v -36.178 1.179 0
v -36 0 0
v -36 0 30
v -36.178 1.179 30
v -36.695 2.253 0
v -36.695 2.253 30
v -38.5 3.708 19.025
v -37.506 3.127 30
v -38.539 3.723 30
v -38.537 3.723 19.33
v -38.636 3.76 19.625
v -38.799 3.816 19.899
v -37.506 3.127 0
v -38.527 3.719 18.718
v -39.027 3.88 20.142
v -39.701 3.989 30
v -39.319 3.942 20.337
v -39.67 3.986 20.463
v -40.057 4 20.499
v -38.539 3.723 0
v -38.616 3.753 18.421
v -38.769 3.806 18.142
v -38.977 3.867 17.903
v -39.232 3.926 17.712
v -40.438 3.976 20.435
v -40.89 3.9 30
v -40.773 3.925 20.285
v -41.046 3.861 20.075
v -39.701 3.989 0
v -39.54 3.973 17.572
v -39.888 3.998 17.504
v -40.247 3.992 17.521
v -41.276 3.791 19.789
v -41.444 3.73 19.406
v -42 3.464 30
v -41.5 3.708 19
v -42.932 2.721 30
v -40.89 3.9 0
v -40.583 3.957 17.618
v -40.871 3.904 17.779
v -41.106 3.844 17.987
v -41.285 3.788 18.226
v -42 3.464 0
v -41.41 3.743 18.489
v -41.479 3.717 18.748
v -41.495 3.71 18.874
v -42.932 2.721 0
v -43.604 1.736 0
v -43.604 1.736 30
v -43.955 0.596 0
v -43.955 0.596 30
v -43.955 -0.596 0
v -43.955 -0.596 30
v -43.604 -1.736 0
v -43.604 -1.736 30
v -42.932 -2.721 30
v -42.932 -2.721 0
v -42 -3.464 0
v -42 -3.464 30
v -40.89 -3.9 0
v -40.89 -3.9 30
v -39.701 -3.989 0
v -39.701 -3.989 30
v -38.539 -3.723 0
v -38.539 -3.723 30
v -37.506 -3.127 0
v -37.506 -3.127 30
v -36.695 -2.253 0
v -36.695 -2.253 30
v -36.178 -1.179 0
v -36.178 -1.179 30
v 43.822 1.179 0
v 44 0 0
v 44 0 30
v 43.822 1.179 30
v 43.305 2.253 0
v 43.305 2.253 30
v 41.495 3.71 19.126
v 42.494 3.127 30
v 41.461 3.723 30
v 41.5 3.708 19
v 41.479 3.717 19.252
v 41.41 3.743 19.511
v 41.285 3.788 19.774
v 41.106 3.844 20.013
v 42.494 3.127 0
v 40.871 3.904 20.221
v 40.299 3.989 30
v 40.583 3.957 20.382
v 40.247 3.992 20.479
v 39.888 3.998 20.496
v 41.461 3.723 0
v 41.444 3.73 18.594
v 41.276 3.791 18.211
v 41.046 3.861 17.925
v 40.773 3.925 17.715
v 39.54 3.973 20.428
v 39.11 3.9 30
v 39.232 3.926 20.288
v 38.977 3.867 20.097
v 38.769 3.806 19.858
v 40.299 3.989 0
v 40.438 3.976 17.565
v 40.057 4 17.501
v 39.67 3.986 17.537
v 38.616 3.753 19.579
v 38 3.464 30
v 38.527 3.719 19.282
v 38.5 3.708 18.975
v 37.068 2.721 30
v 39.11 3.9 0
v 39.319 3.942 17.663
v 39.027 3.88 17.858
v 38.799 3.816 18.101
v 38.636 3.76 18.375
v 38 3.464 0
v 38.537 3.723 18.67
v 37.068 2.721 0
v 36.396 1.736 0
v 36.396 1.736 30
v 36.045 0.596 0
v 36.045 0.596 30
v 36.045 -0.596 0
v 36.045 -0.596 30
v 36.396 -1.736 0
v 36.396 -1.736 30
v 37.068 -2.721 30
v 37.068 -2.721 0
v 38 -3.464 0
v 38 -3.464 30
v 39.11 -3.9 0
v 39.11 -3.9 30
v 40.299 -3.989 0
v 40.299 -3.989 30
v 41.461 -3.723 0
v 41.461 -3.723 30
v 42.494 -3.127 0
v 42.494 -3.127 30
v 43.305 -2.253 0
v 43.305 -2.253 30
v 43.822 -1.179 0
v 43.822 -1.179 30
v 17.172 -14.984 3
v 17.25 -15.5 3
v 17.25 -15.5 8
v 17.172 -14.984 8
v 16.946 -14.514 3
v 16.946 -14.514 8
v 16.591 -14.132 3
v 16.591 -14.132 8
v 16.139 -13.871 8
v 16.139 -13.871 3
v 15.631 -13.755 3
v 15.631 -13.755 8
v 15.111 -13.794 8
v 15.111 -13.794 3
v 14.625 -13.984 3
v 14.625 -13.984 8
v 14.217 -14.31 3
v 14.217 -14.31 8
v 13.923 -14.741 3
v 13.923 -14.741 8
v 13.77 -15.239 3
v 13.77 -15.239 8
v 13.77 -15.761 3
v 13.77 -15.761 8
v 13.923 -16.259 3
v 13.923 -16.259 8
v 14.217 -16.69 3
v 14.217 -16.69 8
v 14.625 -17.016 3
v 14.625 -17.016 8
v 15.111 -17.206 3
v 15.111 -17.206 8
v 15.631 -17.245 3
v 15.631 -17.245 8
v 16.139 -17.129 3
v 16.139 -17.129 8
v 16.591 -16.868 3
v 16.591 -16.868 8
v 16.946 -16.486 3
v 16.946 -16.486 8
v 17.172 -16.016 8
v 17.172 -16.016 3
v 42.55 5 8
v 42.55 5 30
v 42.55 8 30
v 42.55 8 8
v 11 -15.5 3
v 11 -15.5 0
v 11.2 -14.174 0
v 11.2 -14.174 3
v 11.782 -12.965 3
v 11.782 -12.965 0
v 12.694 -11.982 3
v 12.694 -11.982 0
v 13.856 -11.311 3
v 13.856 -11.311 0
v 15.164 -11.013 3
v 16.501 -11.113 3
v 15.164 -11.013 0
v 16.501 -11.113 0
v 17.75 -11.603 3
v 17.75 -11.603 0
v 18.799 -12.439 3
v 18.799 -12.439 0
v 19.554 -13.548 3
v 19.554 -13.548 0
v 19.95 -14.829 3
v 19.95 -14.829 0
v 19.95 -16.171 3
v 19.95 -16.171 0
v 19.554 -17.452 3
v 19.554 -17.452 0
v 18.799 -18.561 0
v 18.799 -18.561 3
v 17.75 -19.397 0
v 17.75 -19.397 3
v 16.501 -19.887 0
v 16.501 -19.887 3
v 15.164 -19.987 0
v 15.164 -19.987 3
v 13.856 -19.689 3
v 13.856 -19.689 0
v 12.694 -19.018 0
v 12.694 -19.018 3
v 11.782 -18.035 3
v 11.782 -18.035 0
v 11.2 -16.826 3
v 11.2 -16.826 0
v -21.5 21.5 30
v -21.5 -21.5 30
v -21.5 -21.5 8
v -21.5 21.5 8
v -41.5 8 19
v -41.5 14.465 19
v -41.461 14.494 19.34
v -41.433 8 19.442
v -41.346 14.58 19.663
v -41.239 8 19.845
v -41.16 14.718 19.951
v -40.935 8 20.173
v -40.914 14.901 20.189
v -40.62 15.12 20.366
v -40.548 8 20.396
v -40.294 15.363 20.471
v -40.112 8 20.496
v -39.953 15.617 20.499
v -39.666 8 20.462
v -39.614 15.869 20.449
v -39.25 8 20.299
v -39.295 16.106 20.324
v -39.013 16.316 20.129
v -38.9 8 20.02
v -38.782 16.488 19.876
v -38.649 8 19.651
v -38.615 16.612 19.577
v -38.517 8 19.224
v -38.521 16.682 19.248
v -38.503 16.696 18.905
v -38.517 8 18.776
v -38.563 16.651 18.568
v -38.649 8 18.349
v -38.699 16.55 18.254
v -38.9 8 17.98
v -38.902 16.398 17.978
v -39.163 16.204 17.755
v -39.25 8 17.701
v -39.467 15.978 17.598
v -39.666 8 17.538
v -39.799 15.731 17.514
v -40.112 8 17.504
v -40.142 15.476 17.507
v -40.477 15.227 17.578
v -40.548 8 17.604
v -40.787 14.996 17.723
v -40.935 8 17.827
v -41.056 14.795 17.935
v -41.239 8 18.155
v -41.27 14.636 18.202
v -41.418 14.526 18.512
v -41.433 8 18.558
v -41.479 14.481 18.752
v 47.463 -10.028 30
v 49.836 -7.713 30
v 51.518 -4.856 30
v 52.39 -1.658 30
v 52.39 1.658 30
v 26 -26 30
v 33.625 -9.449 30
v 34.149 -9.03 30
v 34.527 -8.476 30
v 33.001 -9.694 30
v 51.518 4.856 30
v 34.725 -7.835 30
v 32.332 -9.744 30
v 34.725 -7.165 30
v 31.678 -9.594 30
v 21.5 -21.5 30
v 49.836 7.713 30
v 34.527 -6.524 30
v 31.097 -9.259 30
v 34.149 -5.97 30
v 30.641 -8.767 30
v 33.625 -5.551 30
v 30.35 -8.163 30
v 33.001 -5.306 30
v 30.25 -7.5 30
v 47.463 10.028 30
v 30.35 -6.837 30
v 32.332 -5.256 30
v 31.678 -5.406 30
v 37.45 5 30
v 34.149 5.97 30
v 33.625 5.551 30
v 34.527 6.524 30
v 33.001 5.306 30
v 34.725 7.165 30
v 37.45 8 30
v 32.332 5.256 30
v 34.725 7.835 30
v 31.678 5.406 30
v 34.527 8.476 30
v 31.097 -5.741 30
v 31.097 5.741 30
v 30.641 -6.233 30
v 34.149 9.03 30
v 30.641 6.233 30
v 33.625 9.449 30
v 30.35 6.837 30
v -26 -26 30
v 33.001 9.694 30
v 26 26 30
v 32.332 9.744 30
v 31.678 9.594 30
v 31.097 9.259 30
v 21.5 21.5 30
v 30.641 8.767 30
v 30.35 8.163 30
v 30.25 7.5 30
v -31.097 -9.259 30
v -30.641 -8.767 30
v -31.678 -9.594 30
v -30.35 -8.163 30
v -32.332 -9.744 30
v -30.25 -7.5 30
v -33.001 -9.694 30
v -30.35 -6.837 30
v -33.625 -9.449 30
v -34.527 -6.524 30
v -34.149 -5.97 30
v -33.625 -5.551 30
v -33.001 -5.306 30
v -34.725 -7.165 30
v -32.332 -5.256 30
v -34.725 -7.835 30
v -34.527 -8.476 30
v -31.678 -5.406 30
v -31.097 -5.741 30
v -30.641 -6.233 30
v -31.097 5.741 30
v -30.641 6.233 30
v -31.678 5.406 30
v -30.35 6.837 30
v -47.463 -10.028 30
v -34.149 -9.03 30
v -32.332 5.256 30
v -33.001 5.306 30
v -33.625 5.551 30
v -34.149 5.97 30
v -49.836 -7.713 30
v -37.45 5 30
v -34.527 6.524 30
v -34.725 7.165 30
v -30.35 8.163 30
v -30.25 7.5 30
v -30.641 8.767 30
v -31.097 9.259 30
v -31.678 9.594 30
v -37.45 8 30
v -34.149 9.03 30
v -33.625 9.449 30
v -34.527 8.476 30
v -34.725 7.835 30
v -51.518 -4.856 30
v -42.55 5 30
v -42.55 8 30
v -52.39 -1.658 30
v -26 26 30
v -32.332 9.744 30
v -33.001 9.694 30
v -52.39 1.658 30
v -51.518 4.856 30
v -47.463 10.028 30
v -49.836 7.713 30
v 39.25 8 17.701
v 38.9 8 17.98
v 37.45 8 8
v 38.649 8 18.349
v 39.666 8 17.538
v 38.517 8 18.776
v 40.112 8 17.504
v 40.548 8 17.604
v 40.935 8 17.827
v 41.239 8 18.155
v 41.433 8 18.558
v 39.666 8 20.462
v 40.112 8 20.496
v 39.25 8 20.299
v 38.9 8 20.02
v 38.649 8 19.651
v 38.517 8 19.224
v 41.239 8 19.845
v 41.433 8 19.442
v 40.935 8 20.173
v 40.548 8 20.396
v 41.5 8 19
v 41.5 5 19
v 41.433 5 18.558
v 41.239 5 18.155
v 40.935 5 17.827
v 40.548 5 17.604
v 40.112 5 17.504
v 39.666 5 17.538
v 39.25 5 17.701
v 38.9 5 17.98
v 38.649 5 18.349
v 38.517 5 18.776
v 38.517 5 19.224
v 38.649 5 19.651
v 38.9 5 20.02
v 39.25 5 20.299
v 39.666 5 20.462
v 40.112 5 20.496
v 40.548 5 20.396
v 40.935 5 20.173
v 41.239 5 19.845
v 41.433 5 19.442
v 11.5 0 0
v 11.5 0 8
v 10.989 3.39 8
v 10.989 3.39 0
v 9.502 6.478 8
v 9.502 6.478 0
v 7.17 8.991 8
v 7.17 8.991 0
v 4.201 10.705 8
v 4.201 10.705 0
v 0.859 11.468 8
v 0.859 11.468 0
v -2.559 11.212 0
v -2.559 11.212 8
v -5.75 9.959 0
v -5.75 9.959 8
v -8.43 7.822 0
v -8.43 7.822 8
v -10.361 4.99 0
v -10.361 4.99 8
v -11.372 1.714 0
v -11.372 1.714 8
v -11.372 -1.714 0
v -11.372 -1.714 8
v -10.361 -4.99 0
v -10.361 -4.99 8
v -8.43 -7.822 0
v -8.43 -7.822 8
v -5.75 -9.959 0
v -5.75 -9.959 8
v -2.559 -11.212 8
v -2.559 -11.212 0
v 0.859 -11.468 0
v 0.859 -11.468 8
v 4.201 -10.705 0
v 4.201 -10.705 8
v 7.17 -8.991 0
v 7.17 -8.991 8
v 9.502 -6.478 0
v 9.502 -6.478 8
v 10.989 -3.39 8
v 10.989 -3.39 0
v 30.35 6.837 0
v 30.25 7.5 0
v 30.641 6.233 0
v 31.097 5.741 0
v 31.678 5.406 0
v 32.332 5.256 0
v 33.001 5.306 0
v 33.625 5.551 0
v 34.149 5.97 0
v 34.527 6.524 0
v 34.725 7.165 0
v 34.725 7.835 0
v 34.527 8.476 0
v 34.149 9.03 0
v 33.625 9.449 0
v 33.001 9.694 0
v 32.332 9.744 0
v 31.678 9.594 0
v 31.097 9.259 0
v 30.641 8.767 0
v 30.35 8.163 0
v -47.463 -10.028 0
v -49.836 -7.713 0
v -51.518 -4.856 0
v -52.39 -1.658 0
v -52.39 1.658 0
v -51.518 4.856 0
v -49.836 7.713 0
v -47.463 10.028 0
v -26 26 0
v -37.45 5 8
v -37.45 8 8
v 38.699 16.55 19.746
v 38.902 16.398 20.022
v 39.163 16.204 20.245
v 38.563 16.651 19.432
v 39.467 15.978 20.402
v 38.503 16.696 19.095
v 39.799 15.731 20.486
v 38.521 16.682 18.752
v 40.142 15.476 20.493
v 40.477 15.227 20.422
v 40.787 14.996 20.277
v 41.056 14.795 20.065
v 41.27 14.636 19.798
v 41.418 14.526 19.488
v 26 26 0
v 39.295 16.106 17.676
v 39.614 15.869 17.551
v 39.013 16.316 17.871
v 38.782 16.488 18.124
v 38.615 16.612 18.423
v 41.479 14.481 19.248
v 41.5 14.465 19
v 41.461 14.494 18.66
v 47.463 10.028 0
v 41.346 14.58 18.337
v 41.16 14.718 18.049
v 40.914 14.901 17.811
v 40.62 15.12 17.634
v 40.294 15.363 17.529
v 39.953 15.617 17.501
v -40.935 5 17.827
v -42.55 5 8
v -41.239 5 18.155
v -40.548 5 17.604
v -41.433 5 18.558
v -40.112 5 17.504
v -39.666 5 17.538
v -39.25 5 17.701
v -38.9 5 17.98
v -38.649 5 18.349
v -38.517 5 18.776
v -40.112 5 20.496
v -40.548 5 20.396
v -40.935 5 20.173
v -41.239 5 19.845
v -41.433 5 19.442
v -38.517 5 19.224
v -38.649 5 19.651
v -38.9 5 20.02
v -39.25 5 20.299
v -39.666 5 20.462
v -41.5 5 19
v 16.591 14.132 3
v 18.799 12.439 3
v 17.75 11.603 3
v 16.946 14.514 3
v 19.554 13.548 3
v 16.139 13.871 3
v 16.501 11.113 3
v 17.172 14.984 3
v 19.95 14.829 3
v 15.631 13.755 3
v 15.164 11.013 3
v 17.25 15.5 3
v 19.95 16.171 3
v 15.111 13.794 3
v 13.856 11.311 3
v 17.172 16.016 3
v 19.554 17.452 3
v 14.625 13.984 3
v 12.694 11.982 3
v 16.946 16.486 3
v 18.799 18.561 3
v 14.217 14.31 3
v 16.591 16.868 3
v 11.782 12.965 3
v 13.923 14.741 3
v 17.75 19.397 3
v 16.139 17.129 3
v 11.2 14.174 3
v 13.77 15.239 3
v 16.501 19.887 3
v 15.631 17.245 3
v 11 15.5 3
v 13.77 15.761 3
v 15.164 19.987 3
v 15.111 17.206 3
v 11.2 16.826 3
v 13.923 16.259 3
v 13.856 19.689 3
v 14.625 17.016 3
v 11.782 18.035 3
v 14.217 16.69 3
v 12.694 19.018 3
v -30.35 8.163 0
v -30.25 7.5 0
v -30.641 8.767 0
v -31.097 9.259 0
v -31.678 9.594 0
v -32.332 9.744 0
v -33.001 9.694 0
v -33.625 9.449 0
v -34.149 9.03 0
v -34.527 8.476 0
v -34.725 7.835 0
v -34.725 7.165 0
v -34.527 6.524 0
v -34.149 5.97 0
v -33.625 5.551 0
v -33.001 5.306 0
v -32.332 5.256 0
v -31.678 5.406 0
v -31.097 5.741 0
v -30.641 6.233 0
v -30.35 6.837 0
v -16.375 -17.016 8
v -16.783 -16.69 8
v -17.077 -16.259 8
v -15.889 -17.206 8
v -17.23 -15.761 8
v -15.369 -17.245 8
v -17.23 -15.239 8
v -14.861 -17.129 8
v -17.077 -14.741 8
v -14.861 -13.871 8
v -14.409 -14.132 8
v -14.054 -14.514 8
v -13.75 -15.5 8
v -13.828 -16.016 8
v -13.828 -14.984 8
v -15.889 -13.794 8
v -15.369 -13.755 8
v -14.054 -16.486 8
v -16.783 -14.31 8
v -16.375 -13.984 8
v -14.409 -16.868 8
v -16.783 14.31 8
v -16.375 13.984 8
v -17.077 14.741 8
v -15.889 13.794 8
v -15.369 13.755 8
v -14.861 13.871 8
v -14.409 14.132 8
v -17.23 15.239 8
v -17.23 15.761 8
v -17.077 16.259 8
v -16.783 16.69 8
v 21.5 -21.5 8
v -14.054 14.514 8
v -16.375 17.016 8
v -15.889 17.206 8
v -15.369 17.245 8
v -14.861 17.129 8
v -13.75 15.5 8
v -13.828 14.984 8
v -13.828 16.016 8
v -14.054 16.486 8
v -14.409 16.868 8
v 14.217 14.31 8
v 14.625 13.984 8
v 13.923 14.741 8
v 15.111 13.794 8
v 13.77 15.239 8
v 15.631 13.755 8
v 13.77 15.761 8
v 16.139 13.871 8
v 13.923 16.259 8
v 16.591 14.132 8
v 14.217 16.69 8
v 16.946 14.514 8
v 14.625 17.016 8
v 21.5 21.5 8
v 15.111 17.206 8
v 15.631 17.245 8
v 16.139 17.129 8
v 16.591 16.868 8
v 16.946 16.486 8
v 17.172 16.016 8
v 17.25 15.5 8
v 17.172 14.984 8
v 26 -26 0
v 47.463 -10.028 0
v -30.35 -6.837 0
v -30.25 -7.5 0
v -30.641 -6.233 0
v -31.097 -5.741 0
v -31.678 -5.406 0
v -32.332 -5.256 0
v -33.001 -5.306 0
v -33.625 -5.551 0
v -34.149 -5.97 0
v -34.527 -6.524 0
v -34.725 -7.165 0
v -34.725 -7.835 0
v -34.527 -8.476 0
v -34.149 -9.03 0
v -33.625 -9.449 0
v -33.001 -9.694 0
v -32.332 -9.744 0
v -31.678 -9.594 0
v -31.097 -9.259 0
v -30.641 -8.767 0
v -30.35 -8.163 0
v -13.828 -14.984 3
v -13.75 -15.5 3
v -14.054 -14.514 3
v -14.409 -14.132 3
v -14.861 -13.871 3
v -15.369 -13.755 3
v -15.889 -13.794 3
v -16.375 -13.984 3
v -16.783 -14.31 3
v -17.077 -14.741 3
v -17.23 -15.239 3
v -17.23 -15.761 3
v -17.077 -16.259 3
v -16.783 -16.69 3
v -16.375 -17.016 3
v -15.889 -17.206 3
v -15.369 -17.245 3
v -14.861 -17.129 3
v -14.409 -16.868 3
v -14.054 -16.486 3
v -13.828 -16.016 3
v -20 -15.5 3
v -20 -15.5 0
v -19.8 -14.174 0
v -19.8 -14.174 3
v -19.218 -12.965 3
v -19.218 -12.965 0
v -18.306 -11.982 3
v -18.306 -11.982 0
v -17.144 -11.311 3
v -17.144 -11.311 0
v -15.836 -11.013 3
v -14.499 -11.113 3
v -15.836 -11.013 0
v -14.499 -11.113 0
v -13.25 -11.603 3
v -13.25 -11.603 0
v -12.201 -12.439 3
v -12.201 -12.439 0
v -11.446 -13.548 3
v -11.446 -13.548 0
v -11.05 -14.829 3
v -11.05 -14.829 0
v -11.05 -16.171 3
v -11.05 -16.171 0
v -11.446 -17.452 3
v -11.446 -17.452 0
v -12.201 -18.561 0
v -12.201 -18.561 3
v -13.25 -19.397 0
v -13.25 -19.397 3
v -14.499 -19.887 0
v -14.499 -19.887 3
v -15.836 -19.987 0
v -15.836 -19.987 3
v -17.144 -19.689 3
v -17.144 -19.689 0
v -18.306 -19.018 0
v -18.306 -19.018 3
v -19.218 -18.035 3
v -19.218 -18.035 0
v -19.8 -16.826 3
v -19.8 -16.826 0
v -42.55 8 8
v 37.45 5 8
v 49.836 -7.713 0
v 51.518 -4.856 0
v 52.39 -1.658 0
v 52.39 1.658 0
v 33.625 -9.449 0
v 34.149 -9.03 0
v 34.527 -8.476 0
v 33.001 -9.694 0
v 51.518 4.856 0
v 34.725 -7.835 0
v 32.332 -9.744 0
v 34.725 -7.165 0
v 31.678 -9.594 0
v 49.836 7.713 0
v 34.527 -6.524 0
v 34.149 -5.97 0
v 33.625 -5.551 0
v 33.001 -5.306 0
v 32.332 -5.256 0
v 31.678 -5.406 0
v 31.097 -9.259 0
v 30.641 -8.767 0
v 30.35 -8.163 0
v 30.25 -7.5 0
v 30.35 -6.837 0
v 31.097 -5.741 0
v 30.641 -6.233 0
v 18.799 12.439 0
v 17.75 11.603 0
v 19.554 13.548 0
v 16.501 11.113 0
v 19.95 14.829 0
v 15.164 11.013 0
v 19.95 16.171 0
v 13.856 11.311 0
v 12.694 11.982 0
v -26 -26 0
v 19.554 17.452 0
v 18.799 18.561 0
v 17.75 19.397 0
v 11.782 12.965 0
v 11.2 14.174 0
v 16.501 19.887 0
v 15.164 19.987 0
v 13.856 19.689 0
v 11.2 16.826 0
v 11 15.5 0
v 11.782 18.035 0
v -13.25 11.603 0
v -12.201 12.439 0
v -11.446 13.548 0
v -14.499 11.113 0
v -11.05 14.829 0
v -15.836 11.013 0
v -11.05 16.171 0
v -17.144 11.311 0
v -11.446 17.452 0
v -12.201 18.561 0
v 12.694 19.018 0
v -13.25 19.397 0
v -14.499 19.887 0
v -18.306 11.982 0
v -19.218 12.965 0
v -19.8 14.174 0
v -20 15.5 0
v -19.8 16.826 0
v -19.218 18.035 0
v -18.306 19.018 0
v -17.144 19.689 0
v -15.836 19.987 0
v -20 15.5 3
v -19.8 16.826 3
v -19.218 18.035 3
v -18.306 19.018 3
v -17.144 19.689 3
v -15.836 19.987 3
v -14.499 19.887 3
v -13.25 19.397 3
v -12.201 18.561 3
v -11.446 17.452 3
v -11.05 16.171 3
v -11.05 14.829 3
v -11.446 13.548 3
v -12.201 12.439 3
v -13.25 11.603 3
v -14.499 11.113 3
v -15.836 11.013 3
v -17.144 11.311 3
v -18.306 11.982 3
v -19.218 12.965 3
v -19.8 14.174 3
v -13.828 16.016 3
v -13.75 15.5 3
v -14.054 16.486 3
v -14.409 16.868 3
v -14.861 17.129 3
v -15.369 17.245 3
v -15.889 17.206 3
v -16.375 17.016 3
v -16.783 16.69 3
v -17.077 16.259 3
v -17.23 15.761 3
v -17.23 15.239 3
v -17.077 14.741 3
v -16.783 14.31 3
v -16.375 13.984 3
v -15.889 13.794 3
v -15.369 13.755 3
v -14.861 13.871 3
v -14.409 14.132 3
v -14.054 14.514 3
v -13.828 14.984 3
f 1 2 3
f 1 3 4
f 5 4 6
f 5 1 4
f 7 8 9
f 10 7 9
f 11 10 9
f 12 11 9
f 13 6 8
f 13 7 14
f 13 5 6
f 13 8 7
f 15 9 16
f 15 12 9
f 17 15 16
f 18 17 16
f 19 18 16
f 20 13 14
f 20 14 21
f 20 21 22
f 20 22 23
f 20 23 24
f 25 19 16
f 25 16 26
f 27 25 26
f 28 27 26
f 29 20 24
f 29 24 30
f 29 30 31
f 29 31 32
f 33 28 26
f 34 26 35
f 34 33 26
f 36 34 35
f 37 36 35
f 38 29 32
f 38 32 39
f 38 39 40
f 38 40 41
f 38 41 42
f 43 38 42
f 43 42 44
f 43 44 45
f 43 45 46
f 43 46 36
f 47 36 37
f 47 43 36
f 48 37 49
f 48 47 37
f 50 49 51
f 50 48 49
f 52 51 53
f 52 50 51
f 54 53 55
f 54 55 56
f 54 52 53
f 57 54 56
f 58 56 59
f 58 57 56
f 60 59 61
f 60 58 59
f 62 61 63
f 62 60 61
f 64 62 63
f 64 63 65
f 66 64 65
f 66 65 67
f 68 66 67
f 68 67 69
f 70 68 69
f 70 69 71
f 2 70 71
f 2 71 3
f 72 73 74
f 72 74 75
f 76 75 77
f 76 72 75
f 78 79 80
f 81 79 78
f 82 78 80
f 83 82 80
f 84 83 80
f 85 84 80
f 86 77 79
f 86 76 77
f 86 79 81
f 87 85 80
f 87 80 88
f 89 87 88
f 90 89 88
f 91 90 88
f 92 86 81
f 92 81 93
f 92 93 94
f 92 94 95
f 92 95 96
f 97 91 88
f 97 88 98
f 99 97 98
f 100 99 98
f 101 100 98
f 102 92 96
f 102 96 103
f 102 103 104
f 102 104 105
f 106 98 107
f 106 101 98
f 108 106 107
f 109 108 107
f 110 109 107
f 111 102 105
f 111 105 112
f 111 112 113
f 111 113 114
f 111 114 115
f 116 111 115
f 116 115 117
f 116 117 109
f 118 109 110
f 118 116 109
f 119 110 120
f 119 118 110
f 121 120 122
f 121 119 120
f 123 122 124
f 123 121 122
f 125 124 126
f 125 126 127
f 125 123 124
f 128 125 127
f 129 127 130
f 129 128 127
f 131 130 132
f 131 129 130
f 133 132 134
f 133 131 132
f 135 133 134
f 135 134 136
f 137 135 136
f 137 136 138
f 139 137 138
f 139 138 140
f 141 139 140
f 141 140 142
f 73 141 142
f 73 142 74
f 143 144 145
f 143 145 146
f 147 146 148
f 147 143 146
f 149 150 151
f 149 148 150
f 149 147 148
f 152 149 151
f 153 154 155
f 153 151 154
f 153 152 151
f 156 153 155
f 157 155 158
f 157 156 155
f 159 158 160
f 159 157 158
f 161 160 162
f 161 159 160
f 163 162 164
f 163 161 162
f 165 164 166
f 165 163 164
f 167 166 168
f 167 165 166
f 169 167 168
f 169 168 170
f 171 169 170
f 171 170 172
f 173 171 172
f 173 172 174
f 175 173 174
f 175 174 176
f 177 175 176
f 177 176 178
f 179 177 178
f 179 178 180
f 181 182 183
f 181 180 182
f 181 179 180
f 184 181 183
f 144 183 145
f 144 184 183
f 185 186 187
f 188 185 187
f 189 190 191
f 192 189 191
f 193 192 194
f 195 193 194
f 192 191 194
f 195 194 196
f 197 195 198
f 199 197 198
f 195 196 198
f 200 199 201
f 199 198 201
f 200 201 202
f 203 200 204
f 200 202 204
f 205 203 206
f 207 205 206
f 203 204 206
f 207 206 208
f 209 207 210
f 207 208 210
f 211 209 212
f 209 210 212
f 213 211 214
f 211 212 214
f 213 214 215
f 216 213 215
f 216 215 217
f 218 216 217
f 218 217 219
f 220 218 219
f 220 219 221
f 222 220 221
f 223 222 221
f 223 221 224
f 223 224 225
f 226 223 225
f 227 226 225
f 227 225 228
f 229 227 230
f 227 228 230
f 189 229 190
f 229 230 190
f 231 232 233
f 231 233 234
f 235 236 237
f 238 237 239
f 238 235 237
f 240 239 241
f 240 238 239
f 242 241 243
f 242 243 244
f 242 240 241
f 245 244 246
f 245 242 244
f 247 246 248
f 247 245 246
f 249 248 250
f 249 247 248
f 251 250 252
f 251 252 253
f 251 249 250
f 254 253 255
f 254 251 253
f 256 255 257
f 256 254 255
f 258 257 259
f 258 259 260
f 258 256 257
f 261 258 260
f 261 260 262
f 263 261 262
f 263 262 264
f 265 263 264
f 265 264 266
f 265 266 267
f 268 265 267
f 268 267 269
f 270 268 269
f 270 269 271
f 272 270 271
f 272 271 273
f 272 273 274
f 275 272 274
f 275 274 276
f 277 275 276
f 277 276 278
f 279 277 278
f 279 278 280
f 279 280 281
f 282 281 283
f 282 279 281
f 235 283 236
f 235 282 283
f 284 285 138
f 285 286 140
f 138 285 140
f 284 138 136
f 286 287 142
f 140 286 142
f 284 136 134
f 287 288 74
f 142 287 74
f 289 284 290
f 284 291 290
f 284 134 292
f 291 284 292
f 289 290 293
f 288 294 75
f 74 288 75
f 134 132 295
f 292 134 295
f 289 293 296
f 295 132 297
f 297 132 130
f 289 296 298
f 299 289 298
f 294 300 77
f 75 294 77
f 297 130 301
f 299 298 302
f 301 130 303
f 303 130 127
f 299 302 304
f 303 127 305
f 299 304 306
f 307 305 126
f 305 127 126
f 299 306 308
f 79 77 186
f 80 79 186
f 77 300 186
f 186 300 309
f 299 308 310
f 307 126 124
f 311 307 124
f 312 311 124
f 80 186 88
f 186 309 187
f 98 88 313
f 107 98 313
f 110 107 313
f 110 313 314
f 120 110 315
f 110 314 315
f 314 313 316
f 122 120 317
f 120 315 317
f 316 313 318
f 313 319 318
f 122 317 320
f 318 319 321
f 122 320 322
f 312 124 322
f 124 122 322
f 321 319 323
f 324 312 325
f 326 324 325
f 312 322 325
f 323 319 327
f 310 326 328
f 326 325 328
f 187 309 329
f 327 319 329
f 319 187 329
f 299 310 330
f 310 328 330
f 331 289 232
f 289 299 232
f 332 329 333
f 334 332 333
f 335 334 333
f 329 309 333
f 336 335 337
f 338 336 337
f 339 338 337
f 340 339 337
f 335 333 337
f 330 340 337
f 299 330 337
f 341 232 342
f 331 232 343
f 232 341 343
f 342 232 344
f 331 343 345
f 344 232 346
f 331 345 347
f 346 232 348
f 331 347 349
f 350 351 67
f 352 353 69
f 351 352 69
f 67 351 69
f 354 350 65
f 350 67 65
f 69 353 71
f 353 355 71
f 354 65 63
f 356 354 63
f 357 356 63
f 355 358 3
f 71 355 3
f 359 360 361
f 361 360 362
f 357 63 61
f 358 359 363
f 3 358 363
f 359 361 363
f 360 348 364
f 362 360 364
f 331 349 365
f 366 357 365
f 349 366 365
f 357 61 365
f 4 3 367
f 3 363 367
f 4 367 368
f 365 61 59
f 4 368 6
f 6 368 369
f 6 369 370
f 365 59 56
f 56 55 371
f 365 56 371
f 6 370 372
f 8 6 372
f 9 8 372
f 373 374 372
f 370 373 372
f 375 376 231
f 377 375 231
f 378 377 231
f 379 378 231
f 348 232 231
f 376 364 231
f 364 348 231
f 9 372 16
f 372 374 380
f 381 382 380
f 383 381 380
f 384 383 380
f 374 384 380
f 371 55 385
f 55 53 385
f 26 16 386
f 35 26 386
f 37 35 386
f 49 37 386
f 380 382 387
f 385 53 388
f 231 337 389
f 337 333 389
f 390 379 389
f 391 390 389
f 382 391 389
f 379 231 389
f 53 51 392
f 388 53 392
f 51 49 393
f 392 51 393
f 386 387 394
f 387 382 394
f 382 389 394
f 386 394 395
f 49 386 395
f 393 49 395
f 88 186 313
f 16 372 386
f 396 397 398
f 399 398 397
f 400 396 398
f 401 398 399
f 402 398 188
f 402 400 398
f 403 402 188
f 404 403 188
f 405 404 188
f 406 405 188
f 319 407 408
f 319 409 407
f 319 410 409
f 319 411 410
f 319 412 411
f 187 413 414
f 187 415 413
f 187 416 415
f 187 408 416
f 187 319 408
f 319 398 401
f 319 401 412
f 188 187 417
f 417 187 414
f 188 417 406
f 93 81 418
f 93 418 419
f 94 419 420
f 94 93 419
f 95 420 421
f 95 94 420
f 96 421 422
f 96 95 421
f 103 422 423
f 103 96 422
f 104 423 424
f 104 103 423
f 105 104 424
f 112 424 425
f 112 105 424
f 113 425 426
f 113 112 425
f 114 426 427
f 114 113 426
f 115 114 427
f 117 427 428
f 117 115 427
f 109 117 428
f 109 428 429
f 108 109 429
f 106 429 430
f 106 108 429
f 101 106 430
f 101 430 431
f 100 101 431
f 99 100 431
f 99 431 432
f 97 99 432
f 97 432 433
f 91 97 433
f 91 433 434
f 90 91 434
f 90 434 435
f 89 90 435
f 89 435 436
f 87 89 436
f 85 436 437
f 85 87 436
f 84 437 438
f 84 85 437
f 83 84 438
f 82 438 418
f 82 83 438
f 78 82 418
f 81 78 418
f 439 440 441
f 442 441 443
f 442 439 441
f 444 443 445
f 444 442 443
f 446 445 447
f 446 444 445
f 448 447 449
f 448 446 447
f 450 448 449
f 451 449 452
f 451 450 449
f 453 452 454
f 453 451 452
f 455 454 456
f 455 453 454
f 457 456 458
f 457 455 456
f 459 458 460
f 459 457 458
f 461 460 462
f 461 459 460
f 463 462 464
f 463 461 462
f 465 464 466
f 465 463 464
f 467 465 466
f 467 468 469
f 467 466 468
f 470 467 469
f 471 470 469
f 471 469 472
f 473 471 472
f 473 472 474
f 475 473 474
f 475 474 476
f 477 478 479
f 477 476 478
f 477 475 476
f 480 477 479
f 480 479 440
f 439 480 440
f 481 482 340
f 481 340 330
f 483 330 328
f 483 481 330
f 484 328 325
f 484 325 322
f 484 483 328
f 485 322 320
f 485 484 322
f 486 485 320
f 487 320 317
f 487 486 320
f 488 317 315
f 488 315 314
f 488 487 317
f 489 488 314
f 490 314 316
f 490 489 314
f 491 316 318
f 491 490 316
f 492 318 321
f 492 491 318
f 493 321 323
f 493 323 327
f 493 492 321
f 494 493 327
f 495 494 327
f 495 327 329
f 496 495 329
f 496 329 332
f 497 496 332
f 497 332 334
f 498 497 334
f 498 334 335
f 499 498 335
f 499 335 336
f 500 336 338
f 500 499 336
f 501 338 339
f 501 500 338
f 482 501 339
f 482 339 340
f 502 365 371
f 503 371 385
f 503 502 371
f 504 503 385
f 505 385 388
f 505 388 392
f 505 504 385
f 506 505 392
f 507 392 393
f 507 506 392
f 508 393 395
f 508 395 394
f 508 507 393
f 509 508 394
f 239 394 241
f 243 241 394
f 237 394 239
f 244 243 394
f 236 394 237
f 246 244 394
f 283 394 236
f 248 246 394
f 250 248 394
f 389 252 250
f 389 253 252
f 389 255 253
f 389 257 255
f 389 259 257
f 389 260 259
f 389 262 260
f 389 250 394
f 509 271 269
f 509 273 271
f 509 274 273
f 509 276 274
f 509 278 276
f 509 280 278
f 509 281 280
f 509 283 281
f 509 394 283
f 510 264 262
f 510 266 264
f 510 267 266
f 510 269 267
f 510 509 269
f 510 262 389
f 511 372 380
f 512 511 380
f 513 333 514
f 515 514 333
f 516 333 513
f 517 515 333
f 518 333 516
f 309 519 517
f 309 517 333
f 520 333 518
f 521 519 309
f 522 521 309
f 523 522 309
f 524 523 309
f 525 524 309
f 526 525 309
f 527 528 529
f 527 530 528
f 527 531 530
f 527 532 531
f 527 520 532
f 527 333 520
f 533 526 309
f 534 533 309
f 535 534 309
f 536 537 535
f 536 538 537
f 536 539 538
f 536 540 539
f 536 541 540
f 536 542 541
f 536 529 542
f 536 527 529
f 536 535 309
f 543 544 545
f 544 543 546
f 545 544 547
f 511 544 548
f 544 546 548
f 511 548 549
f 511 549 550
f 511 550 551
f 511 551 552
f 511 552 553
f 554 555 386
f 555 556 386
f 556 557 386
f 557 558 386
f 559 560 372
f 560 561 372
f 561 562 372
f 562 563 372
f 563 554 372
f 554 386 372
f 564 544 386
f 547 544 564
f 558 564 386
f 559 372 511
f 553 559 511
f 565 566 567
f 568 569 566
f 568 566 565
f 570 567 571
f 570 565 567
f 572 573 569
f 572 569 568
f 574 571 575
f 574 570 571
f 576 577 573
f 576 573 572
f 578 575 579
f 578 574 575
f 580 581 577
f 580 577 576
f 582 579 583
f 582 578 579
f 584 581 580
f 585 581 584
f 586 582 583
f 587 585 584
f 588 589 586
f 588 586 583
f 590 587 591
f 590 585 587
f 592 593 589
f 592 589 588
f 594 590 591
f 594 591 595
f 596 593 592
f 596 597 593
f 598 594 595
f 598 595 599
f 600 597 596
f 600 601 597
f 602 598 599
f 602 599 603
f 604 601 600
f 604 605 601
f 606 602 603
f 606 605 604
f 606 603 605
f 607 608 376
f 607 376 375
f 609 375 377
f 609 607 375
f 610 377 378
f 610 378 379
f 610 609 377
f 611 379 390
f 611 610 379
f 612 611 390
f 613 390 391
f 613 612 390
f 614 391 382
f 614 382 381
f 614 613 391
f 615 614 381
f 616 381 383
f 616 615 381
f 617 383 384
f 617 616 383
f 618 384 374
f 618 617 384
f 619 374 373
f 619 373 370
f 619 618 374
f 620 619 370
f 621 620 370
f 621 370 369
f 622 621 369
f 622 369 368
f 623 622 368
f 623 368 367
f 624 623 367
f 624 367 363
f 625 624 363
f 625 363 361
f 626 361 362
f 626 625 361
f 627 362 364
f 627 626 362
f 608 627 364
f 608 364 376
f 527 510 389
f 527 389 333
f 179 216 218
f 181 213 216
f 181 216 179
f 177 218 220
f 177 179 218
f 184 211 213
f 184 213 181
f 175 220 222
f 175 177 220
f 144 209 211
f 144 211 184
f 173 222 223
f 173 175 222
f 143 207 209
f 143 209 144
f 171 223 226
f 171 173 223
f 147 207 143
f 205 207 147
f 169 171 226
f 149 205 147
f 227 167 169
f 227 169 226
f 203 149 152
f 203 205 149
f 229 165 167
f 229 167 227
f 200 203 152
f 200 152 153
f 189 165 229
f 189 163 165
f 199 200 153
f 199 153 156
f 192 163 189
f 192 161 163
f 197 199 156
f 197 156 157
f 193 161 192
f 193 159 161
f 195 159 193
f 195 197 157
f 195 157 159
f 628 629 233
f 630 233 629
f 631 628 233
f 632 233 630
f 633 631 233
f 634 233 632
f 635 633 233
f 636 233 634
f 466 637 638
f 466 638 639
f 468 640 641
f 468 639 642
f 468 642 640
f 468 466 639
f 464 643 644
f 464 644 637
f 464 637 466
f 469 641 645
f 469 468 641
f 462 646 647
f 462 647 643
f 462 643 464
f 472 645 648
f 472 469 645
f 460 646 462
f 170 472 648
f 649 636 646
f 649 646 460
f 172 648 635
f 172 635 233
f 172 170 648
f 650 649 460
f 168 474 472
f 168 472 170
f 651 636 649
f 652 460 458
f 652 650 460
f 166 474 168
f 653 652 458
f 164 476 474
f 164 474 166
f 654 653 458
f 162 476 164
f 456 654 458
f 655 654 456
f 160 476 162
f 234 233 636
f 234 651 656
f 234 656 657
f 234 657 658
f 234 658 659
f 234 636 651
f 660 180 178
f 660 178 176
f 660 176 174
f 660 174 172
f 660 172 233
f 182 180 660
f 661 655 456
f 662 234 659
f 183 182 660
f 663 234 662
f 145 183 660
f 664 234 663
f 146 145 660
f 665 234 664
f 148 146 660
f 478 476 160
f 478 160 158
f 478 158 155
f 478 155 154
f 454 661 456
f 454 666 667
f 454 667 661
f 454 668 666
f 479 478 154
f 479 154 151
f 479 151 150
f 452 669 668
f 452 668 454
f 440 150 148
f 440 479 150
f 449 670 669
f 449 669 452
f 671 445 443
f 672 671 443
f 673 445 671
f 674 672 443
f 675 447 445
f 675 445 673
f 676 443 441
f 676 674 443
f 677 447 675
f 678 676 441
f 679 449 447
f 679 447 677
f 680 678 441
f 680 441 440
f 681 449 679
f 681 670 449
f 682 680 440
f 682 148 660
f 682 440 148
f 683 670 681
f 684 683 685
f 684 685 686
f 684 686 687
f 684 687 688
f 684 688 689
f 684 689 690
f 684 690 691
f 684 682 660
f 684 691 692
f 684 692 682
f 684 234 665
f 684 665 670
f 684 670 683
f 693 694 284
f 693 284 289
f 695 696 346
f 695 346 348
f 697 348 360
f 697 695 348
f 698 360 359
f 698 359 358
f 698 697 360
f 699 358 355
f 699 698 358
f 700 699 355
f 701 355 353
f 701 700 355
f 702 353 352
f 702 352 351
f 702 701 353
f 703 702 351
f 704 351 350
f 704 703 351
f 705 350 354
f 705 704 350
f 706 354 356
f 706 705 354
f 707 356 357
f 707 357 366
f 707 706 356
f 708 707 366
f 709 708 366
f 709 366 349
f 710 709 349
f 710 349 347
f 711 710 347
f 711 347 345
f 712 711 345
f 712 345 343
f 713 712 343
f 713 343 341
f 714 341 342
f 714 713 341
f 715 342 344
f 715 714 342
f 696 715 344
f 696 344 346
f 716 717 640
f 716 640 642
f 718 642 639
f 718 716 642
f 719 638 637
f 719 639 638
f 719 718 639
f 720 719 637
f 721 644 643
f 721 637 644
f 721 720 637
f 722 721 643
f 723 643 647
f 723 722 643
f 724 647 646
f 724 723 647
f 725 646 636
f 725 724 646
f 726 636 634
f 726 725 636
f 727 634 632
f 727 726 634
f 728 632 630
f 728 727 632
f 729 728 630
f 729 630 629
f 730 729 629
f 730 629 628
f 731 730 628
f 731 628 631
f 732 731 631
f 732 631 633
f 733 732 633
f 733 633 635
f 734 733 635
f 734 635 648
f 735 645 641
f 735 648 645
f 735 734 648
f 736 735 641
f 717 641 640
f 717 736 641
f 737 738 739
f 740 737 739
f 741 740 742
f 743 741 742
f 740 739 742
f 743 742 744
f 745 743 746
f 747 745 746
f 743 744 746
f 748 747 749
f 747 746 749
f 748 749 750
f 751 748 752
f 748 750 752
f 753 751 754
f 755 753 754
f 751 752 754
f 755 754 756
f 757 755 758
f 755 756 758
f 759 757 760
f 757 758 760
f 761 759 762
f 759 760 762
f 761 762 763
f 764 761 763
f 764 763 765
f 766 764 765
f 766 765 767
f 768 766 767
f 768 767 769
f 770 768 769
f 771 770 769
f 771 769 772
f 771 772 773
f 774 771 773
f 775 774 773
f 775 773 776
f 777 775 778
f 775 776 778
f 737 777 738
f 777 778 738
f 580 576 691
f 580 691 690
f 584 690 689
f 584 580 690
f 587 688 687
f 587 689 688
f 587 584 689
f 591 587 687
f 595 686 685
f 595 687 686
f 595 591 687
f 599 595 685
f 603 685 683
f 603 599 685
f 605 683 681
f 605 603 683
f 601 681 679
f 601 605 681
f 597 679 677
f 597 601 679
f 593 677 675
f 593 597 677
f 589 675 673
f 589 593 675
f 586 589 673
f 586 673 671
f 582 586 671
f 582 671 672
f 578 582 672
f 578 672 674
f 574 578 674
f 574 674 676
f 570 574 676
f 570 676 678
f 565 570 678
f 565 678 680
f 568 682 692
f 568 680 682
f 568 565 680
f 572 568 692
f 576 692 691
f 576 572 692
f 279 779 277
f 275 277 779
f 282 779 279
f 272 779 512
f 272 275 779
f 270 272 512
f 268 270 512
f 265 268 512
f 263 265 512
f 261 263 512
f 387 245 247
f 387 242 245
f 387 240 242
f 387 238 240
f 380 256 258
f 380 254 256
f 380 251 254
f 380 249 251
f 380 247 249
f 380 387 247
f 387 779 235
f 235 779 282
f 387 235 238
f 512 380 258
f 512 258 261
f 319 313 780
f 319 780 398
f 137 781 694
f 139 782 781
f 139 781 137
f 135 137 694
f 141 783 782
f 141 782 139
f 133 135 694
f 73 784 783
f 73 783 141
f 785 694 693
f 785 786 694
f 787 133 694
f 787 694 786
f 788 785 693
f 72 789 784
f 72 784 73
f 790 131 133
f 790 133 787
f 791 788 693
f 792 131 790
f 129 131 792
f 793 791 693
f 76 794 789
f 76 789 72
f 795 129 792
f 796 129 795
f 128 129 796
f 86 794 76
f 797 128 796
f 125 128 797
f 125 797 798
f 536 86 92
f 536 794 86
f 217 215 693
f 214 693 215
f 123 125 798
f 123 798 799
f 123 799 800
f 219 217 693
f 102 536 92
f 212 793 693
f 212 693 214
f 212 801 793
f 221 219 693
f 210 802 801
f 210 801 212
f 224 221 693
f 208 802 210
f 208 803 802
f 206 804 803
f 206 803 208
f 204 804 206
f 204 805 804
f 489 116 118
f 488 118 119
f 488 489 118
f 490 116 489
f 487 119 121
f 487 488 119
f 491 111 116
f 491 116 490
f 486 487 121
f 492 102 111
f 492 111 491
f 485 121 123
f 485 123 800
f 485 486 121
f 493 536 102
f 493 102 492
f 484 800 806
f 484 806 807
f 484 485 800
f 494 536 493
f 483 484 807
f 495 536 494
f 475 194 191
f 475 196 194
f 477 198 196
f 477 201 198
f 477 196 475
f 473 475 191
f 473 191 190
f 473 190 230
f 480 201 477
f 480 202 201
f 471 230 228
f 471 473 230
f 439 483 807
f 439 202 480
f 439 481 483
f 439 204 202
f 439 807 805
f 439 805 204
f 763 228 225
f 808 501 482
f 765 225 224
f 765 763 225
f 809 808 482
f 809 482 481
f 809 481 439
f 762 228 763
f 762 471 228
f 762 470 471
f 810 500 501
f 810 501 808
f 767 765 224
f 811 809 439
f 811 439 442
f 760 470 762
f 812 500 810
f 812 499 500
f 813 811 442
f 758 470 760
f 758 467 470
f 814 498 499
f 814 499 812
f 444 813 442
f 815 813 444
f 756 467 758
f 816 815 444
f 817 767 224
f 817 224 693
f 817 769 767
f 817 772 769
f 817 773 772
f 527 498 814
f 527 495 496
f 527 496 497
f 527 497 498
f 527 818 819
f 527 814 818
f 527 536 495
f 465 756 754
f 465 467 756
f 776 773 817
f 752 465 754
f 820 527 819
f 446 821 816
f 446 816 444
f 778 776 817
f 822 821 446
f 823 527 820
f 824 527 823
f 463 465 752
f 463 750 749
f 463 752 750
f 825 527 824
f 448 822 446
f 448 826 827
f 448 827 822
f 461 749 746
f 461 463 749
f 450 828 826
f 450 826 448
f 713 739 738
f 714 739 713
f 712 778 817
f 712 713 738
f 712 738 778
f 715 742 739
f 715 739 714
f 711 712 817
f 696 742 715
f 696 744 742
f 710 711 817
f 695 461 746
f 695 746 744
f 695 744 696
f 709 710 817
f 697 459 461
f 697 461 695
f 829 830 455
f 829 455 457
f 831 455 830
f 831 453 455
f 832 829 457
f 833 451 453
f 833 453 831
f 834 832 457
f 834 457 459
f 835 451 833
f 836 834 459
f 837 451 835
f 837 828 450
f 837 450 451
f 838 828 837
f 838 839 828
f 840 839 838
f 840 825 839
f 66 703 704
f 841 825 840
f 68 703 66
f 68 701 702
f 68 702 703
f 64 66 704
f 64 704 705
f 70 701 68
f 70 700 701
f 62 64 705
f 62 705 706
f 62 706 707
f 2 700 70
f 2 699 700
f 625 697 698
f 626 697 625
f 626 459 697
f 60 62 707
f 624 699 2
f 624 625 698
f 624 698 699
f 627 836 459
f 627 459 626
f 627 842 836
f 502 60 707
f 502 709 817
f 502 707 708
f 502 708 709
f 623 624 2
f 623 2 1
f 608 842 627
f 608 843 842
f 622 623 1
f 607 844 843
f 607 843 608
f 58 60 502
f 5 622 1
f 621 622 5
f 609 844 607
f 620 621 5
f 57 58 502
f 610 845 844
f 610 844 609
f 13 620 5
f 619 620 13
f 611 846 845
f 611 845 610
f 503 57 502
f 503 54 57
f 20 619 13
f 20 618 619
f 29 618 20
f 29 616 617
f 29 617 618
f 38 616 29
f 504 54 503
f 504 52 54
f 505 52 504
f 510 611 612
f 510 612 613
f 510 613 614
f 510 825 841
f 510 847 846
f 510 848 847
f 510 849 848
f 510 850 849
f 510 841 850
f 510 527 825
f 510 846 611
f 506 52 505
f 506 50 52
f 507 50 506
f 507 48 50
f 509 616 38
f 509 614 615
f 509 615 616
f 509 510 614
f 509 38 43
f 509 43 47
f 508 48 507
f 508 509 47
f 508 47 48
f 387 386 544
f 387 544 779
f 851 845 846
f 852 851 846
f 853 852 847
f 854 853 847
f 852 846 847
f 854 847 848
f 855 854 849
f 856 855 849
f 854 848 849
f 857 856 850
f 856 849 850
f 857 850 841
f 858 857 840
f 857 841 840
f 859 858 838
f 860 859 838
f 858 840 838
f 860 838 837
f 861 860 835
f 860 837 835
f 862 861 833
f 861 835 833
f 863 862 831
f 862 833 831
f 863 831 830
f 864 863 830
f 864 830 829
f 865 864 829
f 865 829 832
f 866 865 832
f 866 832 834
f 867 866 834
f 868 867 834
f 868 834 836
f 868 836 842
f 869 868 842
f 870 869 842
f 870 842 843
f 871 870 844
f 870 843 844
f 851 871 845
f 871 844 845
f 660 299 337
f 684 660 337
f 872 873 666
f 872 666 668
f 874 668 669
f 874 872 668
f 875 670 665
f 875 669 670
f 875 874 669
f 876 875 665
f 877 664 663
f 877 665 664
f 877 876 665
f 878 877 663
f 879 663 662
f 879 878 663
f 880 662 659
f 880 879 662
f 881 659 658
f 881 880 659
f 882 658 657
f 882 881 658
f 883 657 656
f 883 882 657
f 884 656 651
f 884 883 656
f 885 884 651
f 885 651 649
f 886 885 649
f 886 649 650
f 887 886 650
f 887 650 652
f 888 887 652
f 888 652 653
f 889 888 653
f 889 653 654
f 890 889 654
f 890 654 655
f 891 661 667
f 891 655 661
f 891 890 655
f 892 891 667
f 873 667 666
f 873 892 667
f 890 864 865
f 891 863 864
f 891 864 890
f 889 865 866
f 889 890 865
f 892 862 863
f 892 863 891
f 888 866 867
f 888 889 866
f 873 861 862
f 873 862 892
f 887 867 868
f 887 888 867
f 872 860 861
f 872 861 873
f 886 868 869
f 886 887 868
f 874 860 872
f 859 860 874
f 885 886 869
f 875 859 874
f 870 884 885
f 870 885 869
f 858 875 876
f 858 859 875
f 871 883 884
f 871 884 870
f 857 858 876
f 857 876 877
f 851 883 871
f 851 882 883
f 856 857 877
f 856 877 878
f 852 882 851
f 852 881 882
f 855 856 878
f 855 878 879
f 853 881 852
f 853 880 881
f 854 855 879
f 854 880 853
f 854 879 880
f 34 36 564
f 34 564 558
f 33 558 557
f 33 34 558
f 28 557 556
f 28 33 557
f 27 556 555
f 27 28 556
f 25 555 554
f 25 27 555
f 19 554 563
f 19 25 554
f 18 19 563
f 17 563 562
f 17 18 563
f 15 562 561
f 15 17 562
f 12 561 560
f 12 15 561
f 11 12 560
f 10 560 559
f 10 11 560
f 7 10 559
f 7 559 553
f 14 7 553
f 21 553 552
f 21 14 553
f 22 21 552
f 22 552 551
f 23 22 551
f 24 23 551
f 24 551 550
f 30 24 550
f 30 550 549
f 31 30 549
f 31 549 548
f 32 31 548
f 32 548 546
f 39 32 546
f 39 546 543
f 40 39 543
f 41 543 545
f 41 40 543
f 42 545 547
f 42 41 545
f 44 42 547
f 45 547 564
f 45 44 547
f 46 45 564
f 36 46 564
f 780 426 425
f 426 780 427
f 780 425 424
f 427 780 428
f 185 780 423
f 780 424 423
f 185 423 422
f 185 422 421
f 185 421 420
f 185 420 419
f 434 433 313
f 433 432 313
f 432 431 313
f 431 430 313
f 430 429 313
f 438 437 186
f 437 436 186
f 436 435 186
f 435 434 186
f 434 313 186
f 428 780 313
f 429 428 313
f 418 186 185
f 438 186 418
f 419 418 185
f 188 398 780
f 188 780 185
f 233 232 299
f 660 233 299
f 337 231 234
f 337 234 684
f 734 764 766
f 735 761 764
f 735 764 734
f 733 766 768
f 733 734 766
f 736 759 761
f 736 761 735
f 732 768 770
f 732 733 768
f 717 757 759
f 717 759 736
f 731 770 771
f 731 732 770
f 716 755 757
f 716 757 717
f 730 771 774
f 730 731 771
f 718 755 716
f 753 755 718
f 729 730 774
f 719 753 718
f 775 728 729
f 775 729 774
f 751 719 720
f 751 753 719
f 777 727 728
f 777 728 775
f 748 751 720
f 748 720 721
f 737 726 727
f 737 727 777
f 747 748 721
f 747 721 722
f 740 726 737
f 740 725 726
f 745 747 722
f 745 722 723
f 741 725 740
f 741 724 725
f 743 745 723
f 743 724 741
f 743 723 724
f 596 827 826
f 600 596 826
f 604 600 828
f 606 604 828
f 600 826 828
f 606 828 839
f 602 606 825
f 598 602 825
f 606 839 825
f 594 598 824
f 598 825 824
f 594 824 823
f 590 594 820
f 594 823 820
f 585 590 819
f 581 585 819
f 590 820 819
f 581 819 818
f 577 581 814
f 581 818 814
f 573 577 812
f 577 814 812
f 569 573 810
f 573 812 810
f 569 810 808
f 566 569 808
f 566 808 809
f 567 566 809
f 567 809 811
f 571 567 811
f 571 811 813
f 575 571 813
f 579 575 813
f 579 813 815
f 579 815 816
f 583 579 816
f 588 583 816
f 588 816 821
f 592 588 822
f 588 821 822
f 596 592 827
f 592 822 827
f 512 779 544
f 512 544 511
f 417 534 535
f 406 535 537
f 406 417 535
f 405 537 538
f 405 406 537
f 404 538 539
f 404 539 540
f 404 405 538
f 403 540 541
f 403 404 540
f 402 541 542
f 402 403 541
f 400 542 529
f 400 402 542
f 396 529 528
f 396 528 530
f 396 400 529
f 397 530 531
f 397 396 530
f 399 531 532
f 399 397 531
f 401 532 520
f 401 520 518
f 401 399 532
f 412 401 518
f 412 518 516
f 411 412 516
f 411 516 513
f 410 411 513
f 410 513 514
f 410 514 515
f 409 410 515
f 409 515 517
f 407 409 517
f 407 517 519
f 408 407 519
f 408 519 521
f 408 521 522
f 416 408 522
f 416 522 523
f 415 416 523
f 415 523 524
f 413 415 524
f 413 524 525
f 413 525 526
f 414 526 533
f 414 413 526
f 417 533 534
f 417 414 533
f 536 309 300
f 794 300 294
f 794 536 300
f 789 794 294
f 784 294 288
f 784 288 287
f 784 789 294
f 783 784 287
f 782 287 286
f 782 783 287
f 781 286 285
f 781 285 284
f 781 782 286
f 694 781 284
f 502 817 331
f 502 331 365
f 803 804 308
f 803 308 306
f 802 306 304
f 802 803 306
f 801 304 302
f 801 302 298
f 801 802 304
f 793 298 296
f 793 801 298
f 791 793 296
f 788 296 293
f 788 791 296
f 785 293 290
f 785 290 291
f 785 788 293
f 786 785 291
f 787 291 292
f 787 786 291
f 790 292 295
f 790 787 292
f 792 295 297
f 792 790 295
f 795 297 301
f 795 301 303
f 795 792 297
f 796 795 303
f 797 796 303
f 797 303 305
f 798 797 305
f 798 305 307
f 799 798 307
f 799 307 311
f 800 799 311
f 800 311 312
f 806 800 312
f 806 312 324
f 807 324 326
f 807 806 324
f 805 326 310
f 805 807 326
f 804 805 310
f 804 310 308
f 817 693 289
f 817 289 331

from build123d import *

# Parameters (mm, degrees)
ESBO_O1_R                  = 1.75
ESBO_O1_R_2                = 11.5
ESBO_O1_R_3                = 4
ESBO_O1_R_4                = 2.25
RESSALTO_EXTRUS_O1_DEPTH   = 30
ESBO_O2_W                  = 43
ESBO_O2_H                  = 43
ESBO_O2_W_2                = 5.1
ESBO_O2_H_2                = 3
CORTE_EXTRUS_O1_DEPTH      = 22
ESBO_O3_R                  = 4.5
CORTE_EXTRUS_O2_DEPTH      = 3
CORTE_EXTRUS_O3_DEPTH      = 68.950349521
CORTE_EXTRUS_O3_DEPTH_BACK = 3
ESBO_O4_R                  = 1.5


with BuildPart() as part:
    # Esboço1 → Ressalto-extrusão1 (new body)
    with BuildSketch(Plane.XY):
        with BuildLine():
            Line((-26, 26), (26, 26))
            Line((26, 26), (47.462602, 10.027939539))
            ThreePointArc((47.462602, 10.027939539), (52.5, 0), (47.462602, -10.027939539))
            Line((47.462602, -10.027939539), (26, -26))
            Line((26, -26), (-26, -26))
            Line((-26, -26), (-47.462602, -10.027939539))
            ThreePointArc((-47.462602, -10.027939539), (-52.5, 0), (-47.462602, 10.027939539))
            Line((-47.462602, 10.027939539), (-26, 26))
        make_face()
        with Locations((-15.5, 15.5)):
            Circle(ESBO_O1_R, mode=Mode.SUBTRACT)
        with Locations((15.5, 15.5)):
            Circle(ESBO_O1_R, mode=Mode.SUBTRACT)
        with Locations((15.5, -15.5)):
            Circle(ESBO_O1_R, mode=Mode.SUBTRACT)
        with Locations((-15.5, -15.5)):
            Circle(ESBO_O1_R, mode=Mode.SUBTRACT)
        Circle(ESBO_O1_R_2, mode=Mode.SUBTRACT)
        with Locations((-40, 0)):
            Circle(ESBO_O1_R_3, mode=Mode.SUBTRACT)
        with Locations((40, 0)):
            Circle(ESBO_O1_R_3, mode=Mode.SUBTRACT)
        with Locations((-32.5, 7.5)):
            Circle(ESBO_O1_R_4, mode=Mode.SUBTRACT)
        with Locations((-32.5, -7.5)):
            Circle(ESBO_O1_R_4, mode=Mode.SUBTRACT)
        with Locations(Location((32.5, -7.5, 0), (0, 0, 180))):
            Circle(ESBO_O1_R_4, mode=Mode.SUBTRACT)
        with Locations(Location((32.5, 7.5, 0), (0, 0, 180))):
            Circle(ESBO_O1_R_4, mode=Mode.SUBTRACT)
    extrude(amount=RESSALTO_EXTRUS_O1_DEPTH)

    # Esboço2 → Corte-extrusão1 (cut)
    with BuildSketch(Plane.XY.offset(30)):
        Rectangle(ESBO_O2_W, ESBO_O2_H)
        with Locations((-40, 6.5)):
            Rectangle(ESBO_O2_W_2, ESBO_O2_H_2)
        with Locations((40, 6.5)):
            Rectangle(ESBO_O2_W_2, ESBO_O2_H_2)
    extrude(amount=-CORTE_EXTRUS_O1_DEPTH, mode=Mode.SUBTRACT)

    # Esboço3 → Corte-extrusão2 (cut)
    with BuildSketch(Plane(origin=(0, 0, 0), x_dir=(-1, 0, 0), z_dir=(0, 0, -1))):
        with Locations((-15.5, 15.5)):
            Circle(ESBO_O3_R)
        with Locations((15.5, 15.5)):
            Circle(ESBO_O3_R)
        with Locations((-15.5, -15.5)):
            Circle(ESBO_O3_R)
        with Locations((15.5, -15.5)):
            Circle(ESBO_O3_R)
    extrude(amount=-CORTE_EXTRUS_O2_DEPTH, mode=Mode.SUBTRACT)

    # Esboço4 → Corte-extrusão3 (cut, two sides: drawn at the far end of the back side and taken through both)
    with BuildSketch(Plane(origin=(0, 5, 0), x_dir=(1, 0, 0), z_dir=(0, 1, 0)).offset(-CORTE_EXTRUS_O3_DEPTH_BACK)):
        with Locations(Location((-40, -19, 0), (0, 0, 180))):
            Circle(ESBO_O4_R)
        with Locations((40, -19)):
            Circle(ESBO_O4_R)
    extrude(amount=CORTE_EXTRUS_O3_DEPTH + CORTE_EXTRUS_O3_DEPTH_BACK, mode=Mode.SUBTRACT)


solid = part.part
